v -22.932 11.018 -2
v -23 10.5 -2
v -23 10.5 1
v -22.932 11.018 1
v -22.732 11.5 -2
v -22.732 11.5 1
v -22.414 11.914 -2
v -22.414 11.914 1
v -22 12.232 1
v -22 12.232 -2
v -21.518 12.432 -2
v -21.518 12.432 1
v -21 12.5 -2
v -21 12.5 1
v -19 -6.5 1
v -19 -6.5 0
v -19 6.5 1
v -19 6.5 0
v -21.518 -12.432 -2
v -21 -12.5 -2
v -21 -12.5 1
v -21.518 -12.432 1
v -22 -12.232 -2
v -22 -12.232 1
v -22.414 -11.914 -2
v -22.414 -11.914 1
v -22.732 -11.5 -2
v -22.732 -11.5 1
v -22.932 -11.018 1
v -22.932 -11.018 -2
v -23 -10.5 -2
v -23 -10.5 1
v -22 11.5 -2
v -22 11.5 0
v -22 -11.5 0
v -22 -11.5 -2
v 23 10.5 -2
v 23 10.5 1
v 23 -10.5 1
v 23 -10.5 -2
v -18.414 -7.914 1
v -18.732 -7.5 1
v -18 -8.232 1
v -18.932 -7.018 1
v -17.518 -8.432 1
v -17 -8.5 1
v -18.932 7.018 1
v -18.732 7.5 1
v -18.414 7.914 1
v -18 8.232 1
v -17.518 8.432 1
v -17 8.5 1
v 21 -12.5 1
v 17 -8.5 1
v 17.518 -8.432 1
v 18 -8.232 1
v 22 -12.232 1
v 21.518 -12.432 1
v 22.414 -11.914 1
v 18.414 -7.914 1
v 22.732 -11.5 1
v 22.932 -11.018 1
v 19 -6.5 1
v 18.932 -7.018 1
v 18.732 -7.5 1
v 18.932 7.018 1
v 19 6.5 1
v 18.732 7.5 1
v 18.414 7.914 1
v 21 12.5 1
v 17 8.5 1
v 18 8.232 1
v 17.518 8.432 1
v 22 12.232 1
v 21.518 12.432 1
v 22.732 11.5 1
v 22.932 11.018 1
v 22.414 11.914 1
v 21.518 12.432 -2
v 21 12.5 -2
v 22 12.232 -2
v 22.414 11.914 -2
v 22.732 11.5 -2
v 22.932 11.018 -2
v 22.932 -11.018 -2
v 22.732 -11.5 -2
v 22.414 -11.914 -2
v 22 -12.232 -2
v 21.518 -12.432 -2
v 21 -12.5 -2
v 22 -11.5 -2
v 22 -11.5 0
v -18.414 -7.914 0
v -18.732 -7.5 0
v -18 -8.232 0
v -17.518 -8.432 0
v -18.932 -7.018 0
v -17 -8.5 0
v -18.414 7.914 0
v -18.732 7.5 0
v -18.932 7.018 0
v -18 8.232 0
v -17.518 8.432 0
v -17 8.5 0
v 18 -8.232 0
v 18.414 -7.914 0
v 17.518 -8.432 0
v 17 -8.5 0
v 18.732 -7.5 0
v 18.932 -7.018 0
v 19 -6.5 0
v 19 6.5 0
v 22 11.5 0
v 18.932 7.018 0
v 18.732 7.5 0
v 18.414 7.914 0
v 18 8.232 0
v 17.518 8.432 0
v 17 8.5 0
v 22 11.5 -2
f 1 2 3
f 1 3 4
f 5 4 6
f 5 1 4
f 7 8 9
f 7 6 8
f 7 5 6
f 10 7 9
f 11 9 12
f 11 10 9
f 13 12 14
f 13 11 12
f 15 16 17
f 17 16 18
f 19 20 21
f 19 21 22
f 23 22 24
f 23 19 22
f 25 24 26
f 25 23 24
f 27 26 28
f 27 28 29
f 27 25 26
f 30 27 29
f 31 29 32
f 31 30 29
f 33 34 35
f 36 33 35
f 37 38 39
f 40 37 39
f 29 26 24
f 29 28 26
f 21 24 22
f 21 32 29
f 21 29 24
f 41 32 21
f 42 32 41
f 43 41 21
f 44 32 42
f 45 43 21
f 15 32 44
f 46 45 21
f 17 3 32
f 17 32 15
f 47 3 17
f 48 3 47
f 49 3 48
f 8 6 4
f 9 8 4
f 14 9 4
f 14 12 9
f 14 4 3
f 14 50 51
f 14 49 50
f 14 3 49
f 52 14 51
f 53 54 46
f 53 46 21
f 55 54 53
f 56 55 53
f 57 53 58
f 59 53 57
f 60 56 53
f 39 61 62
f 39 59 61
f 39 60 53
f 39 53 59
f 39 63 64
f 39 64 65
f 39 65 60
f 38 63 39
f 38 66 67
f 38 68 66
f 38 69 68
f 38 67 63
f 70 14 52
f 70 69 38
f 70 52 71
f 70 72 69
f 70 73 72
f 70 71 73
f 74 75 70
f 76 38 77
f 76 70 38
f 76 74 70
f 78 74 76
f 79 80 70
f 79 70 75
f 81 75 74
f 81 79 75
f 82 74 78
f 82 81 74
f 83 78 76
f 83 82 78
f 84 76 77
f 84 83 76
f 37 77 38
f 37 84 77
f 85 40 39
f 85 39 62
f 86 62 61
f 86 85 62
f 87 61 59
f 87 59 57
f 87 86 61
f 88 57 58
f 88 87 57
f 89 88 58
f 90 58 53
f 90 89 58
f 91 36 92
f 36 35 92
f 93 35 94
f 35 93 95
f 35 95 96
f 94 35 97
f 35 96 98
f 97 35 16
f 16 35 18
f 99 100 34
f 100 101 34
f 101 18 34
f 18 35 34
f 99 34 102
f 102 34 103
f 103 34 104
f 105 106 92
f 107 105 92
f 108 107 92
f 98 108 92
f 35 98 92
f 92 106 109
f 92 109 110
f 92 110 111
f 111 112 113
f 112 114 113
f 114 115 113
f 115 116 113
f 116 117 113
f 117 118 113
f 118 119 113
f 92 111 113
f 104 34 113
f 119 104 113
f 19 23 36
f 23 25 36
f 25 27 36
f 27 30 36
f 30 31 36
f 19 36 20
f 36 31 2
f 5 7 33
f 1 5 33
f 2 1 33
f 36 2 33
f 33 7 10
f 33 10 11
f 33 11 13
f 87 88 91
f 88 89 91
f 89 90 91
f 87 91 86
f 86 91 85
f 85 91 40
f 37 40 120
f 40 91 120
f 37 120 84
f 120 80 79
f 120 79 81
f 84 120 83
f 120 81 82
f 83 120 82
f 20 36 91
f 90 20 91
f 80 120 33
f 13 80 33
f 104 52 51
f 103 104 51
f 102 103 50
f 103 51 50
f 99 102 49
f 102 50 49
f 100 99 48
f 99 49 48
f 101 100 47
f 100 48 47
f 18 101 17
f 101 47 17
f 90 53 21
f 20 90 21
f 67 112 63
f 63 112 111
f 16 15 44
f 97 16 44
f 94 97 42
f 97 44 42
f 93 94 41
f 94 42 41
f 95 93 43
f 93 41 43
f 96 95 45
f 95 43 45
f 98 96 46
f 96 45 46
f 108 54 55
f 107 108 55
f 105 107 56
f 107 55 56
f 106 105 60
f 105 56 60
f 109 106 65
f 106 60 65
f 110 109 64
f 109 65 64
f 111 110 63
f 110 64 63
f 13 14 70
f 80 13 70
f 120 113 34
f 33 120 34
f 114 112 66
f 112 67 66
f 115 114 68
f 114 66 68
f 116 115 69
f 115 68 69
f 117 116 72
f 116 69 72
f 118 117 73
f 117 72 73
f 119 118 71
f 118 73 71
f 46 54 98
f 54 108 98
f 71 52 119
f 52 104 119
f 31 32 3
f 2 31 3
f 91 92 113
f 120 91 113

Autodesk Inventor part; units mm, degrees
ref_plane "YZ Plane" through (0, 0, 0) normal (1, 0, 0) x (0, 1, 0)
ref_plane "XZ Plane" through (0, 0, 0) normal (0, 1, 0) x (-1, 0, 0)
ref_plane "XY Plane" through (0, 0, 0) normal (0, 0, 1) x (1, 0, 0)
sketch "Эскиз1" plane through (0, 0, 0) normal (0, 0, 1) x (1, 0, 0)
  line L0 (19, -8.5) -> (-19, -8.5)
  line L1 (-19, -8.5) -> (-19, 8.5)
  line L2 (-19, 8.5) -> (19, 8.5)
  line L3 (19, 8.5) -> (19, -8.5)
  line L4 (19, -8.5) -> (-19, 8.5) construction
  line L5 (-19, -8.5) -> (19, 8.5) construction
  line L6 (22, -11.5) -> (-22, -11.5)
  line L7 (-22, -11.5) -> (-22, 11.5)
  line L8 (-22, 11.5) -> (22, 11.5)
  line L9 (22, 11.5) -> (22, -11.5)
  line L10 (22, -11.5) -> (-22, 11.5) construction
  line L11 (-22, -11.5) -> (22, 11.5) construction
  point P0 (0, 0)
  dimension "d0" = 44
  dimension "d1" = 23
  dimension "d2" = 3
  dimension "d3" = 3
extrude "Выдавливание1" add sketch "Эскиз1" along normal blind 1
sketch "Эскиз2" plane through (0, 0, 1) normal (0, 0, 1) x (1, 0, 0)
  line L0 (22, 11.5) -> (-22, 11.5) projected
  line L1 (-22, 11.5) -> (-22, -11.5) projected
  line L2 (-22, -11.5) -> (22, -11.5) projected
  line L3 (22, -11.5) -> (22, 11.5) projected
  line L4 (19, -8.5) -> (-19, -8.5) projected
  line L5 (-19, -8.5) -> (-19, 8.5) projected
  line L6 (-19, 8.5) -> (19, 8.5) projected
  line L7 (19, 8.5) -> (19, -8.5) projected
  line L8 (-23, 12.5) -> (23, 12.5)
  line L9 (23, 12.5) -> (23, -12.5)
  line L10 (23, -12.5) -> (-23, -12.5)
  line L11 (-23, -12.5) -> (-23, 12.5)
  point P0 (0, 0)
  dimension "d6" = 1
extrude "Выдавливание2" add sketch "Эскиз2" against normal blind 3 contours L8 L9 L10 L11
fillet "Сопряжение1" radius 2 8 edges at (23, 12.5, -0.5) (-23, 12.5, -0.5) (-23, -12.5, -0.5) (23, -12.5, -0.5) (-19, 8.5, 0.5) (19, 8.5, 0.5) (19, -8.5, 0.5) (-19, -8.5, 0.5)
properties part number "крышечка"
